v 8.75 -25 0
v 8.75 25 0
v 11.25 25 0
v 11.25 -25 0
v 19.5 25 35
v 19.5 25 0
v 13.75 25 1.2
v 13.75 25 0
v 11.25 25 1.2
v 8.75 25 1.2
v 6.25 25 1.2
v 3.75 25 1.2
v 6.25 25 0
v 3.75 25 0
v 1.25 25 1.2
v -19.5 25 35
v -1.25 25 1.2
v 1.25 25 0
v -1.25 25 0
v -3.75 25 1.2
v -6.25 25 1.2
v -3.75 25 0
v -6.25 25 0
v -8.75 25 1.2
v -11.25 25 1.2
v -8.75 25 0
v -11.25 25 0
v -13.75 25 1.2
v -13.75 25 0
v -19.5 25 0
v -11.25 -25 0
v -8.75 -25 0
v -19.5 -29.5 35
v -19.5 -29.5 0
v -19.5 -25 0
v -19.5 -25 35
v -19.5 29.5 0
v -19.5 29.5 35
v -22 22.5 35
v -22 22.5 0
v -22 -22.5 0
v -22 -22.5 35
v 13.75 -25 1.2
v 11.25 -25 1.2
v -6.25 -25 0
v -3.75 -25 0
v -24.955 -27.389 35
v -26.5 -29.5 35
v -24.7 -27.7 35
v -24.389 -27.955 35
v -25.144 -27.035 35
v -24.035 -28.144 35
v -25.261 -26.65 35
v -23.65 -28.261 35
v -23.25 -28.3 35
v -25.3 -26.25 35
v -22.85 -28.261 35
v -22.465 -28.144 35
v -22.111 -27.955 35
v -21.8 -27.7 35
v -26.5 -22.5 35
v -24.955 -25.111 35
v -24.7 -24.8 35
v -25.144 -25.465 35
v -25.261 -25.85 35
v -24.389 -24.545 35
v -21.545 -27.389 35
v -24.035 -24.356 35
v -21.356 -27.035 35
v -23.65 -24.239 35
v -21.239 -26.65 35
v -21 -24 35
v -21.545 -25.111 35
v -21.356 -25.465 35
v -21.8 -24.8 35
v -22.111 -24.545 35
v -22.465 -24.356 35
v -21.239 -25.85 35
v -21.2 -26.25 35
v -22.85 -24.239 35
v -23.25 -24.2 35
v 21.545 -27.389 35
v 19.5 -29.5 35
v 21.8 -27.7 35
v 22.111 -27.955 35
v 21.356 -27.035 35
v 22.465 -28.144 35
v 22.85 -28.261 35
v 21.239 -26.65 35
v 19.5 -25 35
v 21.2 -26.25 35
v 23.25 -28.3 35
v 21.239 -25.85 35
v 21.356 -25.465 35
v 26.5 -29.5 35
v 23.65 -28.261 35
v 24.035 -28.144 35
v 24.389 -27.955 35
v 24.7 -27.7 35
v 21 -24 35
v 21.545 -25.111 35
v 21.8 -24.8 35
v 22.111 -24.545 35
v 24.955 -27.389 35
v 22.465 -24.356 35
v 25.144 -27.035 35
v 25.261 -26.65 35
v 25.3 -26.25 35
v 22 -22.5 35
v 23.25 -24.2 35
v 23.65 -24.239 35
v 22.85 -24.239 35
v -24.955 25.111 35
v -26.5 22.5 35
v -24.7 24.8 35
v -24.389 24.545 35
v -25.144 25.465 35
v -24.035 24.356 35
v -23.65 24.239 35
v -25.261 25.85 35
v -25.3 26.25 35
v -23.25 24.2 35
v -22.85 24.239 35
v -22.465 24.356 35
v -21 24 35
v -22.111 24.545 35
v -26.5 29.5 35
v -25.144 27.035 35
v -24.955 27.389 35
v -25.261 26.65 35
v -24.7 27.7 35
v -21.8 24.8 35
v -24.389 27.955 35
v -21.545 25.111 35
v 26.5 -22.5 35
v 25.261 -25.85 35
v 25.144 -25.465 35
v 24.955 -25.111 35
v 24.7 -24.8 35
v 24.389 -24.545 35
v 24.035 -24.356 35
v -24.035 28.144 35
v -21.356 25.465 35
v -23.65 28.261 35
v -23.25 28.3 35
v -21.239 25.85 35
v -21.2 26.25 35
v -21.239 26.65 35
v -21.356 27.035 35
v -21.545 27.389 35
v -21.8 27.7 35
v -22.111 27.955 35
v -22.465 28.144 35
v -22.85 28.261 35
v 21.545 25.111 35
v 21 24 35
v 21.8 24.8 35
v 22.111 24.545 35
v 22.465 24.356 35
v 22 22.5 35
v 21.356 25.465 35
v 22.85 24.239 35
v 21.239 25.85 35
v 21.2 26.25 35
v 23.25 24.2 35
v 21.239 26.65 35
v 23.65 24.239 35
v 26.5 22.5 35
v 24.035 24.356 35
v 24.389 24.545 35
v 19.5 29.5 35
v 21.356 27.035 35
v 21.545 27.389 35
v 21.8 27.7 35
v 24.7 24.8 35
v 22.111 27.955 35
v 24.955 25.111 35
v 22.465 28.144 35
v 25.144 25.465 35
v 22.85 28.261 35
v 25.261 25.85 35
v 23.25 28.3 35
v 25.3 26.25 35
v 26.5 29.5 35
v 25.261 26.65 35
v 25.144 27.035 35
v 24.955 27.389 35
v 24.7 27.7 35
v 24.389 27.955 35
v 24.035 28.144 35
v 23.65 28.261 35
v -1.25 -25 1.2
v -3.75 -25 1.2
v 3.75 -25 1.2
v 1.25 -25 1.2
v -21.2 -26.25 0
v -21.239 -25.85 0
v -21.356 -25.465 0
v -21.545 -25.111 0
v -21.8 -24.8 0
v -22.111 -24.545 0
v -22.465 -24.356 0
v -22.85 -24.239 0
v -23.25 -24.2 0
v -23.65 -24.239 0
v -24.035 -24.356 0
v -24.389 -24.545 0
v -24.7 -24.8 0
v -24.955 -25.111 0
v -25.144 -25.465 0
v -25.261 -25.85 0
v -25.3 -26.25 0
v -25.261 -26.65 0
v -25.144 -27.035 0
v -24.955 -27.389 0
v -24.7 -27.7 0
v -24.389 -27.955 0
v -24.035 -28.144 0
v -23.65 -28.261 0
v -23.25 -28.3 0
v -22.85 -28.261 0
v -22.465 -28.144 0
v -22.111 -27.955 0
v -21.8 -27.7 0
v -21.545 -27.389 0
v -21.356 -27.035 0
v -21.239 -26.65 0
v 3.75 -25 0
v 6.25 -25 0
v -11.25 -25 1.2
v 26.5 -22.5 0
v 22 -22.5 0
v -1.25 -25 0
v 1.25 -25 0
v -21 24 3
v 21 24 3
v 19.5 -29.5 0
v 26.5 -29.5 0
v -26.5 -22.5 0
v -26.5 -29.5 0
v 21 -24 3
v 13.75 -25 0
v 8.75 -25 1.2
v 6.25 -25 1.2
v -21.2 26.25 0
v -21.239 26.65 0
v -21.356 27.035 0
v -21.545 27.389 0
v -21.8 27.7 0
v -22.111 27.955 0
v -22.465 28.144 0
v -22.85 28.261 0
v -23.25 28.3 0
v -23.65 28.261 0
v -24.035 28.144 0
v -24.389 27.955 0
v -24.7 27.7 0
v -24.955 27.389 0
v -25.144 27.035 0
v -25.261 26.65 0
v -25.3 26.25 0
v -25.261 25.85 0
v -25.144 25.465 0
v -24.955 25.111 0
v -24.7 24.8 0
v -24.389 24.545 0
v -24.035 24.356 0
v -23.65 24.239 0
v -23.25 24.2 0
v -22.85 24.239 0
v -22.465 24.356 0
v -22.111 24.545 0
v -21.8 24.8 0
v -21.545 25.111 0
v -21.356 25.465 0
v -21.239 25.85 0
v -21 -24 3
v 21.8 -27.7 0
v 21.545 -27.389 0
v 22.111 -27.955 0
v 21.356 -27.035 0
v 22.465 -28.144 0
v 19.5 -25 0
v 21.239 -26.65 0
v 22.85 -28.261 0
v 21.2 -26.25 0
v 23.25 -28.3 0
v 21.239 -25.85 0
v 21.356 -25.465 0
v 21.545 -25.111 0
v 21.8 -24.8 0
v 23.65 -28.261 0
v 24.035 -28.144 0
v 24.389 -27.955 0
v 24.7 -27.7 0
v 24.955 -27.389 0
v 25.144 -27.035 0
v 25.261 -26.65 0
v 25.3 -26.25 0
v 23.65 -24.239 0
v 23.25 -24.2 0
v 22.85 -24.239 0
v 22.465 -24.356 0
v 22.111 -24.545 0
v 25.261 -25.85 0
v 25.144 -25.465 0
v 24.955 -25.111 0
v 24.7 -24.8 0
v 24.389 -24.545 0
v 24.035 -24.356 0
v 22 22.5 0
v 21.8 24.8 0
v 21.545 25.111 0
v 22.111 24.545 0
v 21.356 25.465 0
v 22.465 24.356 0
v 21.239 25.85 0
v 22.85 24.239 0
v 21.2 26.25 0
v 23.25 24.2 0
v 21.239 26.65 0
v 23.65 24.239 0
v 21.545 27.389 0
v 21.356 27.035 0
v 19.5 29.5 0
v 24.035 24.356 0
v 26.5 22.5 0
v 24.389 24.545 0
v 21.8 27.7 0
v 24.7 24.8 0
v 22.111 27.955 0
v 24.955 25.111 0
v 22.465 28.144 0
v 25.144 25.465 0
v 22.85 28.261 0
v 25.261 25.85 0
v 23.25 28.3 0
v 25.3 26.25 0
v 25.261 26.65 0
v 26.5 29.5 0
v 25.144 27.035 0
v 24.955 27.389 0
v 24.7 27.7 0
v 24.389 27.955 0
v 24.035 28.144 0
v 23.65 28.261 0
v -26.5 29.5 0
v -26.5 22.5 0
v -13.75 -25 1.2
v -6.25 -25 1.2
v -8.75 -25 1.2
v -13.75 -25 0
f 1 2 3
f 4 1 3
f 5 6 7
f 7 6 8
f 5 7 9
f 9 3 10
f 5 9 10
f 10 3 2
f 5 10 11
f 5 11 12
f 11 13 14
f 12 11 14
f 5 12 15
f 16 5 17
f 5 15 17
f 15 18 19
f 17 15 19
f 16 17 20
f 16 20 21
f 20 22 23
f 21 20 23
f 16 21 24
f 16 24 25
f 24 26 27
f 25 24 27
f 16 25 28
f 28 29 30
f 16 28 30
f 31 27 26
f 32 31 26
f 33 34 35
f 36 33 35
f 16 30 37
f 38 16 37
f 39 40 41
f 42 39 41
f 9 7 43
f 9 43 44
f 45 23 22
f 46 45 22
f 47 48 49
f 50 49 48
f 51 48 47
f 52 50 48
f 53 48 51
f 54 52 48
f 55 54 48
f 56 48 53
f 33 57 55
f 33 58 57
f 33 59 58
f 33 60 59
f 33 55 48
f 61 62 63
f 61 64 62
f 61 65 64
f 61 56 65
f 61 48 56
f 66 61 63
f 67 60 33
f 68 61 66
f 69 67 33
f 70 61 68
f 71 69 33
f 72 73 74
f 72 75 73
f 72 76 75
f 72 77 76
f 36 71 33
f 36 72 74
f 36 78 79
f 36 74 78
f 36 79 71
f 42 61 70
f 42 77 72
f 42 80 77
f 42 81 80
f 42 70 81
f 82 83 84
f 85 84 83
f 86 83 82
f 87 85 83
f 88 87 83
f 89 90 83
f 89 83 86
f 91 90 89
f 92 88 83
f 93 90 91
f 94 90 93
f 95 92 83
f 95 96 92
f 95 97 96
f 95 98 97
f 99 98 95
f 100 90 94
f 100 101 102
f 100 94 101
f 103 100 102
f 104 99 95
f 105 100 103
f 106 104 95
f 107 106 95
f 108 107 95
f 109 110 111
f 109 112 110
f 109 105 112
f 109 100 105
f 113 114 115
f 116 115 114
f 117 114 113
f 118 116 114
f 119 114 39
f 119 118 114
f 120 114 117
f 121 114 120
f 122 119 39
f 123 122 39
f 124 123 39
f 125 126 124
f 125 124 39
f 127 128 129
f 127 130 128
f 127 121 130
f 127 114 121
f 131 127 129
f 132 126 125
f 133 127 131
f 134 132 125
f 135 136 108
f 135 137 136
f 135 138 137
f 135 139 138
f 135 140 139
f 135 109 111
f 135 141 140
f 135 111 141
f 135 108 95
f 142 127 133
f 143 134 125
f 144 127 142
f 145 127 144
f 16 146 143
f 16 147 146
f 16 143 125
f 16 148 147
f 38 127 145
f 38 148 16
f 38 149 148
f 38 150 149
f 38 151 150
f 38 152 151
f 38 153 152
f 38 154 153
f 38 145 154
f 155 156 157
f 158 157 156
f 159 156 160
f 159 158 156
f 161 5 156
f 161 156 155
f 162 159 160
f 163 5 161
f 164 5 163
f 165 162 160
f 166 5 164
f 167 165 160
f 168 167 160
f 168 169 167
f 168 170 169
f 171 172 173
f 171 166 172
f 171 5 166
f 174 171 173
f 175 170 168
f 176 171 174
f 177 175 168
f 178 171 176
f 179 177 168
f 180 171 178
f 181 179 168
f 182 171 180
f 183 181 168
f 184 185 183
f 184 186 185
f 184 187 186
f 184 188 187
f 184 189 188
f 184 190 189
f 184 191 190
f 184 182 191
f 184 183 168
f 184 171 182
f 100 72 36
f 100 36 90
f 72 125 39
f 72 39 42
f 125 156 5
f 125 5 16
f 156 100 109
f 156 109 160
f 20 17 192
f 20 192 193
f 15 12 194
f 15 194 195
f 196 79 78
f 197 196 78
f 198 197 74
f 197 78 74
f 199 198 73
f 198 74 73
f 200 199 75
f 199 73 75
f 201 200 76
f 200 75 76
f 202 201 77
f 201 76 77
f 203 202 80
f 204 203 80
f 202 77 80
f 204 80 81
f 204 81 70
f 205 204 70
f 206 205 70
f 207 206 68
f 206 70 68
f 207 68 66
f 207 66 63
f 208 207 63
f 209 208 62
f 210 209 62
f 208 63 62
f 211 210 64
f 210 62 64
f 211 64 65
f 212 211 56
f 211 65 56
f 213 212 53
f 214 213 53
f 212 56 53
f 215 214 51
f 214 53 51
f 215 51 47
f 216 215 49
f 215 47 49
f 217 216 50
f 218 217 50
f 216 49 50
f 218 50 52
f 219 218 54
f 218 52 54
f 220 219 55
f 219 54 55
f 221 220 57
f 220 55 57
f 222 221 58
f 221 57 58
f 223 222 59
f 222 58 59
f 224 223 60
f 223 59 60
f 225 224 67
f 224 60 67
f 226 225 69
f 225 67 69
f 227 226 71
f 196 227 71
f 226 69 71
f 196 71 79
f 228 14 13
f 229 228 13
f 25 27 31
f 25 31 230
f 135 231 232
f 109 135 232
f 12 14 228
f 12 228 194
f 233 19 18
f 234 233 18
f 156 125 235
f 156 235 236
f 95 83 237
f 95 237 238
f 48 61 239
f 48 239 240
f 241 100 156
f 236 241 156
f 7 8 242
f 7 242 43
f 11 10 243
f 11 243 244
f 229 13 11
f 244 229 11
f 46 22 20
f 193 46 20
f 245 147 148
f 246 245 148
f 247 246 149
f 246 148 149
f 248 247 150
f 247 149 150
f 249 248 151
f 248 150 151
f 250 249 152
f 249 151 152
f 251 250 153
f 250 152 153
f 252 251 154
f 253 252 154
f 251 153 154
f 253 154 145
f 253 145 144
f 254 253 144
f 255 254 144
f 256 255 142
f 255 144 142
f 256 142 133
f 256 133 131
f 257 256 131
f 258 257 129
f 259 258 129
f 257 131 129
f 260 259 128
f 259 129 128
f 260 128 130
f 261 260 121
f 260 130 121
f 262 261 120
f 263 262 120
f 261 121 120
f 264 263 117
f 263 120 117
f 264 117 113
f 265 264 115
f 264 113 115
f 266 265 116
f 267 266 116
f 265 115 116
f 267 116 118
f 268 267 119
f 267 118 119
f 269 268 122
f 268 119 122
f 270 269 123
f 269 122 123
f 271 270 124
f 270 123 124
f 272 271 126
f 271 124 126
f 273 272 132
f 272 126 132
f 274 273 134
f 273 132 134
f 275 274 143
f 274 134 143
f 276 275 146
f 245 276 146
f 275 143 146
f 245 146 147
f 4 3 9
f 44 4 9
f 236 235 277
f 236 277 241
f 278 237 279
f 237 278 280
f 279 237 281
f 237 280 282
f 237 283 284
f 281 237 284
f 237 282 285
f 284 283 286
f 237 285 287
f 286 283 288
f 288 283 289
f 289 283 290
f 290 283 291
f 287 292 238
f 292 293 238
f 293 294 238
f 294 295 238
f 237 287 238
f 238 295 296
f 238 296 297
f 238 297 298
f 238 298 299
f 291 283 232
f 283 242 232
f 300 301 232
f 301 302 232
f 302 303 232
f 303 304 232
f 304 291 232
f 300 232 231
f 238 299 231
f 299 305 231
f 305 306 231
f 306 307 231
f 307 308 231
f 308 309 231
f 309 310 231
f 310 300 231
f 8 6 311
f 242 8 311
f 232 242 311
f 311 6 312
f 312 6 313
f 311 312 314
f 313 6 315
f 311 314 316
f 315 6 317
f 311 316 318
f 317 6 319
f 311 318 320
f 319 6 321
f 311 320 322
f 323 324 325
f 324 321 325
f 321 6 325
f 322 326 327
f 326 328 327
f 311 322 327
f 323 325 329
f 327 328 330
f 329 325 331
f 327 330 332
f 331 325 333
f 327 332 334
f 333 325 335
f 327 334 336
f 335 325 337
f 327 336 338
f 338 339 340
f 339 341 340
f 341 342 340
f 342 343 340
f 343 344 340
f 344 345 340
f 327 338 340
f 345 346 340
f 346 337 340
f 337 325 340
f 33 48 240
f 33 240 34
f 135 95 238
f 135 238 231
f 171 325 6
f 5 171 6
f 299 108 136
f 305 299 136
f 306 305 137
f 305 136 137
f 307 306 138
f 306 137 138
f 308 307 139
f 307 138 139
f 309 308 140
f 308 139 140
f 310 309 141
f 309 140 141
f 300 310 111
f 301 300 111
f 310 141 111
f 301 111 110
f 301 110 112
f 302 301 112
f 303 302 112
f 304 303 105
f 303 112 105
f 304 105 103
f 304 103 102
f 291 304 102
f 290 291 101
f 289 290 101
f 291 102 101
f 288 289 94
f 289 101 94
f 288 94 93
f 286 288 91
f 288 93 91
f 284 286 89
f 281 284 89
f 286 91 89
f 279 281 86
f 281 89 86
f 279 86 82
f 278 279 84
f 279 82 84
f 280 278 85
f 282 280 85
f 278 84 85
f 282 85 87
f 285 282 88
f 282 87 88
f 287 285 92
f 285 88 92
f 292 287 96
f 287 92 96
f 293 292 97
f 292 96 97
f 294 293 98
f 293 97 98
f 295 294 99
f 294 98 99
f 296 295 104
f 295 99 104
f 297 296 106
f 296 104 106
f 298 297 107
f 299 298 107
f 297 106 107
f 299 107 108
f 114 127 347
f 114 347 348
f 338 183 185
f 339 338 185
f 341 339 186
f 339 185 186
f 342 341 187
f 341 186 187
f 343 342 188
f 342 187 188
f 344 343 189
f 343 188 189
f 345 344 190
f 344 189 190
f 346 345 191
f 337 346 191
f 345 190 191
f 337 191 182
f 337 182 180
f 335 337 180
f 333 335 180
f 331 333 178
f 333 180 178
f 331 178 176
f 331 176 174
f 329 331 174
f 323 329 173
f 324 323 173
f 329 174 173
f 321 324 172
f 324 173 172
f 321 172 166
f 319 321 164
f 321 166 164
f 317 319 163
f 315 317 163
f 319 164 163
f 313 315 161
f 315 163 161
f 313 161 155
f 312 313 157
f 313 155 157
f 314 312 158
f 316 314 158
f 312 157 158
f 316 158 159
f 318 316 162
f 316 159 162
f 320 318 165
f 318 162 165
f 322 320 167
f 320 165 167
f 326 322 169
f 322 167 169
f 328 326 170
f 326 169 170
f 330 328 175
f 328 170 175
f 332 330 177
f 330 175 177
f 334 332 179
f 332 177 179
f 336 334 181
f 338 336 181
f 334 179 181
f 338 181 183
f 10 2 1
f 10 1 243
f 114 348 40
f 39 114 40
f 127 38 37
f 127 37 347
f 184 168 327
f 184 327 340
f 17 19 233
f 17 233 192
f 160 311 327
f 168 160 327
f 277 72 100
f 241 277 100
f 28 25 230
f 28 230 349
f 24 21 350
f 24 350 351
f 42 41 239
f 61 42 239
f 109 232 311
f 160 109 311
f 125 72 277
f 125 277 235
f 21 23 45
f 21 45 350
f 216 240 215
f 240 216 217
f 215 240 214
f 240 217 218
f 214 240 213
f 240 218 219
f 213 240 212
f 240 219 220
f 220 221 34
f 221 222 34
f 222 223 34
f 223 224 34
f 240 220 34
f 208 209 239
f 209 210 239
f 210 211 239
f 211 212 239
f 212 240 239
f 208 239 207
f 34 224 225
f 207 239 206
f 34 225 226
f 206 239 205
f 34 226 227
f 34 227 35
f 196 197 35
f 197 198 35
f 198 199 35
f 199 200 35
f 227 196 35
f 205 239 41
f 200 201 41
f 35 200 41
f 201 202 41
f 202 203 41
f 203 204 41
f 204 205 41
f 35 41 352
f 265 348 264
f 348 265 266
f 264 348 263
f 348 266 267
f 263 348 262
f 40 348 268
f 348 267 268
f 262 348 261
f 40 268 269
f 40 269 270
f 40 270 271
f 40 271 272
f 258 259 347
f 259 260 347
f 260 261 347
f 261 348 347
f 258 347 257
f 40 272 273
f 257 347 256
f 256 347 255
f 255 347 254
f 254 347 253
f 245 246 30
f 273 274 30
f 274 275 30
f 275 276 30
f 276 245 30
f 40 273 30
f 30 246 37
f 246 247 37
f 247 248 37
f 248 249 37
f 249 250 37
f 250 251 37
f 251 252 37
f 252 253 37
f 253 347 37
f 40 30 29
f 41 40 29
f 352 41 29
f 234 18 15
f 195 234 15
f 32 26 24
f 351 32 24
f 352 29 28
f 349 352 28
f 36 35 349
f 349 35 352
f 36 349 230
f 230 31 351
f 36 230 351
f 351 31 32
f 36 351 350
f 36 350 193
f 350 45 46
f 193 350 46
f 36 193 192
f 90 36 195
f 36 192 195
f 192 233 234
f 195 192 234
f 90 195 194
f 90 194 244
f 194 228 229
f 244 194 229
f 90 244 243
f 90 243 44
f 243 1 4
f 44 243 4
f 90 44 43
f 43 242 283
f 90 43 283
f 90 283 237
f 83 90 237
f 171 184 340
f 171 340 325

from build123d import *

# Parameters (mm, degrees)
F0_W     = 2.5
F0_H     = 2.5
F1_DEPTH = 35
F2_R     = 2.05
F3_DEPTH = 35
F4_W     = 42
F4_H     = 48
F5_DEPTH = 32
F6_W     = 2.5
F6_H     = 1.2
F7_DEPTH = 50


with BuildPart() as f1:
    # F0 (on Top) → F1 (new body)
    with BuildSketch(Plane.XY):
        Polygon((-22, 22.5), (-22, 25), (-19.5, 25), (-19.5, 29.5), (-26.5, 29.5), (-26.5, 22.5), align=None)
        with Locations((-20.75, 23.75)):
            Rectangle(F0_W, F0_H)
        Polygon((19.5, 25), (-19.5, 25), (-19.5, 22.5), (-22, 22.5), (-22, -22.5), (-19.5, -22.5), (-19.5, -25), (19.5, -25), (19.5, -22.5), (22, -22.5), (22, 22.5), (19.5, 22.5), align=None)
        Polygon((19.5, 29.5), (19.5, 25), (22, 25), (22, 22.5), (26.5, 22.5), (26.5, 29.5), align=None)
        with Locations((20.75, 23.75)):
            Rectangle(F0_W, F0_H)
        with Locations((-20.75, -23.75)):
            Rectangle(F0_W, F0_H)
        Polygon((-22, -25), (-22, -22.5), (-26.5, -22.5), (-26.5, -29.5), (-19.5, -29.5), (-19.5, -25), align=None)
        Polygon((26.5, -22.5), (22, -22.5), (22, -25), (19.5, -25), (19.5, -29.5), (26.5, -29.5), align=None)
        with Locations((20.75, -23.75)):
            Rectangle(F0_W, F0_H)
    extrude(amount=F1_DEPTH)

    # F2 (on face) → F3 (cut, through all)
    with BuildSketch(Plane.XY.offset(35)):
        with Locations((-23.25, 26.25)):
            Circle(F2_R)
        with Locations((23.25, 26.25)):
            Circle(F2_R)
        with Locations((-23.25, -26.25)):
            Circle(F2_R)
        with Locations((23.25, -26.25)):
            Circle(F2_R)
    extrude(amount=-F3_DEPTH, mode=Mode.SUBTRACT)

    # F4 (on face) → F5 (cut)
    with BuildSketch(Plane.XY.offset(35)):
        Rectangle(F4_W, F4_H)
    extrude(amount=-F5_DEPTH, mode=Mode.SUBTRACT)

    # F6 (on face) → F7 (cut, through all)
    with BuildSketch(Plane(origin=(0, 25, 0), x_dir=(-1, 0, 0), z_dir=(0, 1, 0))):
        with Locations((12.5, 0.6)):
            Rectangle(F6_W, F6_H)
        with Locations((7.5, 0.6)):
            Rectangle(F6_W, F6_H)
        with Locations((2.5, 0.6)):
            Rectangle(F6_W, F6_H)
        with Locations((-2.5, 0.6)):
            Rectangle(F6_W, F6_H)
        with Locations((-7.5, 0.6)):
            Rectangle(F6_W, F6_H)
        with Locations((-12.5, 0.6)):
            Rectangle(F6_W, F6_H)
    extrude(amount=-F7_DEPTH, mode=Mode.SUBTRACT)


solid = f1.part
